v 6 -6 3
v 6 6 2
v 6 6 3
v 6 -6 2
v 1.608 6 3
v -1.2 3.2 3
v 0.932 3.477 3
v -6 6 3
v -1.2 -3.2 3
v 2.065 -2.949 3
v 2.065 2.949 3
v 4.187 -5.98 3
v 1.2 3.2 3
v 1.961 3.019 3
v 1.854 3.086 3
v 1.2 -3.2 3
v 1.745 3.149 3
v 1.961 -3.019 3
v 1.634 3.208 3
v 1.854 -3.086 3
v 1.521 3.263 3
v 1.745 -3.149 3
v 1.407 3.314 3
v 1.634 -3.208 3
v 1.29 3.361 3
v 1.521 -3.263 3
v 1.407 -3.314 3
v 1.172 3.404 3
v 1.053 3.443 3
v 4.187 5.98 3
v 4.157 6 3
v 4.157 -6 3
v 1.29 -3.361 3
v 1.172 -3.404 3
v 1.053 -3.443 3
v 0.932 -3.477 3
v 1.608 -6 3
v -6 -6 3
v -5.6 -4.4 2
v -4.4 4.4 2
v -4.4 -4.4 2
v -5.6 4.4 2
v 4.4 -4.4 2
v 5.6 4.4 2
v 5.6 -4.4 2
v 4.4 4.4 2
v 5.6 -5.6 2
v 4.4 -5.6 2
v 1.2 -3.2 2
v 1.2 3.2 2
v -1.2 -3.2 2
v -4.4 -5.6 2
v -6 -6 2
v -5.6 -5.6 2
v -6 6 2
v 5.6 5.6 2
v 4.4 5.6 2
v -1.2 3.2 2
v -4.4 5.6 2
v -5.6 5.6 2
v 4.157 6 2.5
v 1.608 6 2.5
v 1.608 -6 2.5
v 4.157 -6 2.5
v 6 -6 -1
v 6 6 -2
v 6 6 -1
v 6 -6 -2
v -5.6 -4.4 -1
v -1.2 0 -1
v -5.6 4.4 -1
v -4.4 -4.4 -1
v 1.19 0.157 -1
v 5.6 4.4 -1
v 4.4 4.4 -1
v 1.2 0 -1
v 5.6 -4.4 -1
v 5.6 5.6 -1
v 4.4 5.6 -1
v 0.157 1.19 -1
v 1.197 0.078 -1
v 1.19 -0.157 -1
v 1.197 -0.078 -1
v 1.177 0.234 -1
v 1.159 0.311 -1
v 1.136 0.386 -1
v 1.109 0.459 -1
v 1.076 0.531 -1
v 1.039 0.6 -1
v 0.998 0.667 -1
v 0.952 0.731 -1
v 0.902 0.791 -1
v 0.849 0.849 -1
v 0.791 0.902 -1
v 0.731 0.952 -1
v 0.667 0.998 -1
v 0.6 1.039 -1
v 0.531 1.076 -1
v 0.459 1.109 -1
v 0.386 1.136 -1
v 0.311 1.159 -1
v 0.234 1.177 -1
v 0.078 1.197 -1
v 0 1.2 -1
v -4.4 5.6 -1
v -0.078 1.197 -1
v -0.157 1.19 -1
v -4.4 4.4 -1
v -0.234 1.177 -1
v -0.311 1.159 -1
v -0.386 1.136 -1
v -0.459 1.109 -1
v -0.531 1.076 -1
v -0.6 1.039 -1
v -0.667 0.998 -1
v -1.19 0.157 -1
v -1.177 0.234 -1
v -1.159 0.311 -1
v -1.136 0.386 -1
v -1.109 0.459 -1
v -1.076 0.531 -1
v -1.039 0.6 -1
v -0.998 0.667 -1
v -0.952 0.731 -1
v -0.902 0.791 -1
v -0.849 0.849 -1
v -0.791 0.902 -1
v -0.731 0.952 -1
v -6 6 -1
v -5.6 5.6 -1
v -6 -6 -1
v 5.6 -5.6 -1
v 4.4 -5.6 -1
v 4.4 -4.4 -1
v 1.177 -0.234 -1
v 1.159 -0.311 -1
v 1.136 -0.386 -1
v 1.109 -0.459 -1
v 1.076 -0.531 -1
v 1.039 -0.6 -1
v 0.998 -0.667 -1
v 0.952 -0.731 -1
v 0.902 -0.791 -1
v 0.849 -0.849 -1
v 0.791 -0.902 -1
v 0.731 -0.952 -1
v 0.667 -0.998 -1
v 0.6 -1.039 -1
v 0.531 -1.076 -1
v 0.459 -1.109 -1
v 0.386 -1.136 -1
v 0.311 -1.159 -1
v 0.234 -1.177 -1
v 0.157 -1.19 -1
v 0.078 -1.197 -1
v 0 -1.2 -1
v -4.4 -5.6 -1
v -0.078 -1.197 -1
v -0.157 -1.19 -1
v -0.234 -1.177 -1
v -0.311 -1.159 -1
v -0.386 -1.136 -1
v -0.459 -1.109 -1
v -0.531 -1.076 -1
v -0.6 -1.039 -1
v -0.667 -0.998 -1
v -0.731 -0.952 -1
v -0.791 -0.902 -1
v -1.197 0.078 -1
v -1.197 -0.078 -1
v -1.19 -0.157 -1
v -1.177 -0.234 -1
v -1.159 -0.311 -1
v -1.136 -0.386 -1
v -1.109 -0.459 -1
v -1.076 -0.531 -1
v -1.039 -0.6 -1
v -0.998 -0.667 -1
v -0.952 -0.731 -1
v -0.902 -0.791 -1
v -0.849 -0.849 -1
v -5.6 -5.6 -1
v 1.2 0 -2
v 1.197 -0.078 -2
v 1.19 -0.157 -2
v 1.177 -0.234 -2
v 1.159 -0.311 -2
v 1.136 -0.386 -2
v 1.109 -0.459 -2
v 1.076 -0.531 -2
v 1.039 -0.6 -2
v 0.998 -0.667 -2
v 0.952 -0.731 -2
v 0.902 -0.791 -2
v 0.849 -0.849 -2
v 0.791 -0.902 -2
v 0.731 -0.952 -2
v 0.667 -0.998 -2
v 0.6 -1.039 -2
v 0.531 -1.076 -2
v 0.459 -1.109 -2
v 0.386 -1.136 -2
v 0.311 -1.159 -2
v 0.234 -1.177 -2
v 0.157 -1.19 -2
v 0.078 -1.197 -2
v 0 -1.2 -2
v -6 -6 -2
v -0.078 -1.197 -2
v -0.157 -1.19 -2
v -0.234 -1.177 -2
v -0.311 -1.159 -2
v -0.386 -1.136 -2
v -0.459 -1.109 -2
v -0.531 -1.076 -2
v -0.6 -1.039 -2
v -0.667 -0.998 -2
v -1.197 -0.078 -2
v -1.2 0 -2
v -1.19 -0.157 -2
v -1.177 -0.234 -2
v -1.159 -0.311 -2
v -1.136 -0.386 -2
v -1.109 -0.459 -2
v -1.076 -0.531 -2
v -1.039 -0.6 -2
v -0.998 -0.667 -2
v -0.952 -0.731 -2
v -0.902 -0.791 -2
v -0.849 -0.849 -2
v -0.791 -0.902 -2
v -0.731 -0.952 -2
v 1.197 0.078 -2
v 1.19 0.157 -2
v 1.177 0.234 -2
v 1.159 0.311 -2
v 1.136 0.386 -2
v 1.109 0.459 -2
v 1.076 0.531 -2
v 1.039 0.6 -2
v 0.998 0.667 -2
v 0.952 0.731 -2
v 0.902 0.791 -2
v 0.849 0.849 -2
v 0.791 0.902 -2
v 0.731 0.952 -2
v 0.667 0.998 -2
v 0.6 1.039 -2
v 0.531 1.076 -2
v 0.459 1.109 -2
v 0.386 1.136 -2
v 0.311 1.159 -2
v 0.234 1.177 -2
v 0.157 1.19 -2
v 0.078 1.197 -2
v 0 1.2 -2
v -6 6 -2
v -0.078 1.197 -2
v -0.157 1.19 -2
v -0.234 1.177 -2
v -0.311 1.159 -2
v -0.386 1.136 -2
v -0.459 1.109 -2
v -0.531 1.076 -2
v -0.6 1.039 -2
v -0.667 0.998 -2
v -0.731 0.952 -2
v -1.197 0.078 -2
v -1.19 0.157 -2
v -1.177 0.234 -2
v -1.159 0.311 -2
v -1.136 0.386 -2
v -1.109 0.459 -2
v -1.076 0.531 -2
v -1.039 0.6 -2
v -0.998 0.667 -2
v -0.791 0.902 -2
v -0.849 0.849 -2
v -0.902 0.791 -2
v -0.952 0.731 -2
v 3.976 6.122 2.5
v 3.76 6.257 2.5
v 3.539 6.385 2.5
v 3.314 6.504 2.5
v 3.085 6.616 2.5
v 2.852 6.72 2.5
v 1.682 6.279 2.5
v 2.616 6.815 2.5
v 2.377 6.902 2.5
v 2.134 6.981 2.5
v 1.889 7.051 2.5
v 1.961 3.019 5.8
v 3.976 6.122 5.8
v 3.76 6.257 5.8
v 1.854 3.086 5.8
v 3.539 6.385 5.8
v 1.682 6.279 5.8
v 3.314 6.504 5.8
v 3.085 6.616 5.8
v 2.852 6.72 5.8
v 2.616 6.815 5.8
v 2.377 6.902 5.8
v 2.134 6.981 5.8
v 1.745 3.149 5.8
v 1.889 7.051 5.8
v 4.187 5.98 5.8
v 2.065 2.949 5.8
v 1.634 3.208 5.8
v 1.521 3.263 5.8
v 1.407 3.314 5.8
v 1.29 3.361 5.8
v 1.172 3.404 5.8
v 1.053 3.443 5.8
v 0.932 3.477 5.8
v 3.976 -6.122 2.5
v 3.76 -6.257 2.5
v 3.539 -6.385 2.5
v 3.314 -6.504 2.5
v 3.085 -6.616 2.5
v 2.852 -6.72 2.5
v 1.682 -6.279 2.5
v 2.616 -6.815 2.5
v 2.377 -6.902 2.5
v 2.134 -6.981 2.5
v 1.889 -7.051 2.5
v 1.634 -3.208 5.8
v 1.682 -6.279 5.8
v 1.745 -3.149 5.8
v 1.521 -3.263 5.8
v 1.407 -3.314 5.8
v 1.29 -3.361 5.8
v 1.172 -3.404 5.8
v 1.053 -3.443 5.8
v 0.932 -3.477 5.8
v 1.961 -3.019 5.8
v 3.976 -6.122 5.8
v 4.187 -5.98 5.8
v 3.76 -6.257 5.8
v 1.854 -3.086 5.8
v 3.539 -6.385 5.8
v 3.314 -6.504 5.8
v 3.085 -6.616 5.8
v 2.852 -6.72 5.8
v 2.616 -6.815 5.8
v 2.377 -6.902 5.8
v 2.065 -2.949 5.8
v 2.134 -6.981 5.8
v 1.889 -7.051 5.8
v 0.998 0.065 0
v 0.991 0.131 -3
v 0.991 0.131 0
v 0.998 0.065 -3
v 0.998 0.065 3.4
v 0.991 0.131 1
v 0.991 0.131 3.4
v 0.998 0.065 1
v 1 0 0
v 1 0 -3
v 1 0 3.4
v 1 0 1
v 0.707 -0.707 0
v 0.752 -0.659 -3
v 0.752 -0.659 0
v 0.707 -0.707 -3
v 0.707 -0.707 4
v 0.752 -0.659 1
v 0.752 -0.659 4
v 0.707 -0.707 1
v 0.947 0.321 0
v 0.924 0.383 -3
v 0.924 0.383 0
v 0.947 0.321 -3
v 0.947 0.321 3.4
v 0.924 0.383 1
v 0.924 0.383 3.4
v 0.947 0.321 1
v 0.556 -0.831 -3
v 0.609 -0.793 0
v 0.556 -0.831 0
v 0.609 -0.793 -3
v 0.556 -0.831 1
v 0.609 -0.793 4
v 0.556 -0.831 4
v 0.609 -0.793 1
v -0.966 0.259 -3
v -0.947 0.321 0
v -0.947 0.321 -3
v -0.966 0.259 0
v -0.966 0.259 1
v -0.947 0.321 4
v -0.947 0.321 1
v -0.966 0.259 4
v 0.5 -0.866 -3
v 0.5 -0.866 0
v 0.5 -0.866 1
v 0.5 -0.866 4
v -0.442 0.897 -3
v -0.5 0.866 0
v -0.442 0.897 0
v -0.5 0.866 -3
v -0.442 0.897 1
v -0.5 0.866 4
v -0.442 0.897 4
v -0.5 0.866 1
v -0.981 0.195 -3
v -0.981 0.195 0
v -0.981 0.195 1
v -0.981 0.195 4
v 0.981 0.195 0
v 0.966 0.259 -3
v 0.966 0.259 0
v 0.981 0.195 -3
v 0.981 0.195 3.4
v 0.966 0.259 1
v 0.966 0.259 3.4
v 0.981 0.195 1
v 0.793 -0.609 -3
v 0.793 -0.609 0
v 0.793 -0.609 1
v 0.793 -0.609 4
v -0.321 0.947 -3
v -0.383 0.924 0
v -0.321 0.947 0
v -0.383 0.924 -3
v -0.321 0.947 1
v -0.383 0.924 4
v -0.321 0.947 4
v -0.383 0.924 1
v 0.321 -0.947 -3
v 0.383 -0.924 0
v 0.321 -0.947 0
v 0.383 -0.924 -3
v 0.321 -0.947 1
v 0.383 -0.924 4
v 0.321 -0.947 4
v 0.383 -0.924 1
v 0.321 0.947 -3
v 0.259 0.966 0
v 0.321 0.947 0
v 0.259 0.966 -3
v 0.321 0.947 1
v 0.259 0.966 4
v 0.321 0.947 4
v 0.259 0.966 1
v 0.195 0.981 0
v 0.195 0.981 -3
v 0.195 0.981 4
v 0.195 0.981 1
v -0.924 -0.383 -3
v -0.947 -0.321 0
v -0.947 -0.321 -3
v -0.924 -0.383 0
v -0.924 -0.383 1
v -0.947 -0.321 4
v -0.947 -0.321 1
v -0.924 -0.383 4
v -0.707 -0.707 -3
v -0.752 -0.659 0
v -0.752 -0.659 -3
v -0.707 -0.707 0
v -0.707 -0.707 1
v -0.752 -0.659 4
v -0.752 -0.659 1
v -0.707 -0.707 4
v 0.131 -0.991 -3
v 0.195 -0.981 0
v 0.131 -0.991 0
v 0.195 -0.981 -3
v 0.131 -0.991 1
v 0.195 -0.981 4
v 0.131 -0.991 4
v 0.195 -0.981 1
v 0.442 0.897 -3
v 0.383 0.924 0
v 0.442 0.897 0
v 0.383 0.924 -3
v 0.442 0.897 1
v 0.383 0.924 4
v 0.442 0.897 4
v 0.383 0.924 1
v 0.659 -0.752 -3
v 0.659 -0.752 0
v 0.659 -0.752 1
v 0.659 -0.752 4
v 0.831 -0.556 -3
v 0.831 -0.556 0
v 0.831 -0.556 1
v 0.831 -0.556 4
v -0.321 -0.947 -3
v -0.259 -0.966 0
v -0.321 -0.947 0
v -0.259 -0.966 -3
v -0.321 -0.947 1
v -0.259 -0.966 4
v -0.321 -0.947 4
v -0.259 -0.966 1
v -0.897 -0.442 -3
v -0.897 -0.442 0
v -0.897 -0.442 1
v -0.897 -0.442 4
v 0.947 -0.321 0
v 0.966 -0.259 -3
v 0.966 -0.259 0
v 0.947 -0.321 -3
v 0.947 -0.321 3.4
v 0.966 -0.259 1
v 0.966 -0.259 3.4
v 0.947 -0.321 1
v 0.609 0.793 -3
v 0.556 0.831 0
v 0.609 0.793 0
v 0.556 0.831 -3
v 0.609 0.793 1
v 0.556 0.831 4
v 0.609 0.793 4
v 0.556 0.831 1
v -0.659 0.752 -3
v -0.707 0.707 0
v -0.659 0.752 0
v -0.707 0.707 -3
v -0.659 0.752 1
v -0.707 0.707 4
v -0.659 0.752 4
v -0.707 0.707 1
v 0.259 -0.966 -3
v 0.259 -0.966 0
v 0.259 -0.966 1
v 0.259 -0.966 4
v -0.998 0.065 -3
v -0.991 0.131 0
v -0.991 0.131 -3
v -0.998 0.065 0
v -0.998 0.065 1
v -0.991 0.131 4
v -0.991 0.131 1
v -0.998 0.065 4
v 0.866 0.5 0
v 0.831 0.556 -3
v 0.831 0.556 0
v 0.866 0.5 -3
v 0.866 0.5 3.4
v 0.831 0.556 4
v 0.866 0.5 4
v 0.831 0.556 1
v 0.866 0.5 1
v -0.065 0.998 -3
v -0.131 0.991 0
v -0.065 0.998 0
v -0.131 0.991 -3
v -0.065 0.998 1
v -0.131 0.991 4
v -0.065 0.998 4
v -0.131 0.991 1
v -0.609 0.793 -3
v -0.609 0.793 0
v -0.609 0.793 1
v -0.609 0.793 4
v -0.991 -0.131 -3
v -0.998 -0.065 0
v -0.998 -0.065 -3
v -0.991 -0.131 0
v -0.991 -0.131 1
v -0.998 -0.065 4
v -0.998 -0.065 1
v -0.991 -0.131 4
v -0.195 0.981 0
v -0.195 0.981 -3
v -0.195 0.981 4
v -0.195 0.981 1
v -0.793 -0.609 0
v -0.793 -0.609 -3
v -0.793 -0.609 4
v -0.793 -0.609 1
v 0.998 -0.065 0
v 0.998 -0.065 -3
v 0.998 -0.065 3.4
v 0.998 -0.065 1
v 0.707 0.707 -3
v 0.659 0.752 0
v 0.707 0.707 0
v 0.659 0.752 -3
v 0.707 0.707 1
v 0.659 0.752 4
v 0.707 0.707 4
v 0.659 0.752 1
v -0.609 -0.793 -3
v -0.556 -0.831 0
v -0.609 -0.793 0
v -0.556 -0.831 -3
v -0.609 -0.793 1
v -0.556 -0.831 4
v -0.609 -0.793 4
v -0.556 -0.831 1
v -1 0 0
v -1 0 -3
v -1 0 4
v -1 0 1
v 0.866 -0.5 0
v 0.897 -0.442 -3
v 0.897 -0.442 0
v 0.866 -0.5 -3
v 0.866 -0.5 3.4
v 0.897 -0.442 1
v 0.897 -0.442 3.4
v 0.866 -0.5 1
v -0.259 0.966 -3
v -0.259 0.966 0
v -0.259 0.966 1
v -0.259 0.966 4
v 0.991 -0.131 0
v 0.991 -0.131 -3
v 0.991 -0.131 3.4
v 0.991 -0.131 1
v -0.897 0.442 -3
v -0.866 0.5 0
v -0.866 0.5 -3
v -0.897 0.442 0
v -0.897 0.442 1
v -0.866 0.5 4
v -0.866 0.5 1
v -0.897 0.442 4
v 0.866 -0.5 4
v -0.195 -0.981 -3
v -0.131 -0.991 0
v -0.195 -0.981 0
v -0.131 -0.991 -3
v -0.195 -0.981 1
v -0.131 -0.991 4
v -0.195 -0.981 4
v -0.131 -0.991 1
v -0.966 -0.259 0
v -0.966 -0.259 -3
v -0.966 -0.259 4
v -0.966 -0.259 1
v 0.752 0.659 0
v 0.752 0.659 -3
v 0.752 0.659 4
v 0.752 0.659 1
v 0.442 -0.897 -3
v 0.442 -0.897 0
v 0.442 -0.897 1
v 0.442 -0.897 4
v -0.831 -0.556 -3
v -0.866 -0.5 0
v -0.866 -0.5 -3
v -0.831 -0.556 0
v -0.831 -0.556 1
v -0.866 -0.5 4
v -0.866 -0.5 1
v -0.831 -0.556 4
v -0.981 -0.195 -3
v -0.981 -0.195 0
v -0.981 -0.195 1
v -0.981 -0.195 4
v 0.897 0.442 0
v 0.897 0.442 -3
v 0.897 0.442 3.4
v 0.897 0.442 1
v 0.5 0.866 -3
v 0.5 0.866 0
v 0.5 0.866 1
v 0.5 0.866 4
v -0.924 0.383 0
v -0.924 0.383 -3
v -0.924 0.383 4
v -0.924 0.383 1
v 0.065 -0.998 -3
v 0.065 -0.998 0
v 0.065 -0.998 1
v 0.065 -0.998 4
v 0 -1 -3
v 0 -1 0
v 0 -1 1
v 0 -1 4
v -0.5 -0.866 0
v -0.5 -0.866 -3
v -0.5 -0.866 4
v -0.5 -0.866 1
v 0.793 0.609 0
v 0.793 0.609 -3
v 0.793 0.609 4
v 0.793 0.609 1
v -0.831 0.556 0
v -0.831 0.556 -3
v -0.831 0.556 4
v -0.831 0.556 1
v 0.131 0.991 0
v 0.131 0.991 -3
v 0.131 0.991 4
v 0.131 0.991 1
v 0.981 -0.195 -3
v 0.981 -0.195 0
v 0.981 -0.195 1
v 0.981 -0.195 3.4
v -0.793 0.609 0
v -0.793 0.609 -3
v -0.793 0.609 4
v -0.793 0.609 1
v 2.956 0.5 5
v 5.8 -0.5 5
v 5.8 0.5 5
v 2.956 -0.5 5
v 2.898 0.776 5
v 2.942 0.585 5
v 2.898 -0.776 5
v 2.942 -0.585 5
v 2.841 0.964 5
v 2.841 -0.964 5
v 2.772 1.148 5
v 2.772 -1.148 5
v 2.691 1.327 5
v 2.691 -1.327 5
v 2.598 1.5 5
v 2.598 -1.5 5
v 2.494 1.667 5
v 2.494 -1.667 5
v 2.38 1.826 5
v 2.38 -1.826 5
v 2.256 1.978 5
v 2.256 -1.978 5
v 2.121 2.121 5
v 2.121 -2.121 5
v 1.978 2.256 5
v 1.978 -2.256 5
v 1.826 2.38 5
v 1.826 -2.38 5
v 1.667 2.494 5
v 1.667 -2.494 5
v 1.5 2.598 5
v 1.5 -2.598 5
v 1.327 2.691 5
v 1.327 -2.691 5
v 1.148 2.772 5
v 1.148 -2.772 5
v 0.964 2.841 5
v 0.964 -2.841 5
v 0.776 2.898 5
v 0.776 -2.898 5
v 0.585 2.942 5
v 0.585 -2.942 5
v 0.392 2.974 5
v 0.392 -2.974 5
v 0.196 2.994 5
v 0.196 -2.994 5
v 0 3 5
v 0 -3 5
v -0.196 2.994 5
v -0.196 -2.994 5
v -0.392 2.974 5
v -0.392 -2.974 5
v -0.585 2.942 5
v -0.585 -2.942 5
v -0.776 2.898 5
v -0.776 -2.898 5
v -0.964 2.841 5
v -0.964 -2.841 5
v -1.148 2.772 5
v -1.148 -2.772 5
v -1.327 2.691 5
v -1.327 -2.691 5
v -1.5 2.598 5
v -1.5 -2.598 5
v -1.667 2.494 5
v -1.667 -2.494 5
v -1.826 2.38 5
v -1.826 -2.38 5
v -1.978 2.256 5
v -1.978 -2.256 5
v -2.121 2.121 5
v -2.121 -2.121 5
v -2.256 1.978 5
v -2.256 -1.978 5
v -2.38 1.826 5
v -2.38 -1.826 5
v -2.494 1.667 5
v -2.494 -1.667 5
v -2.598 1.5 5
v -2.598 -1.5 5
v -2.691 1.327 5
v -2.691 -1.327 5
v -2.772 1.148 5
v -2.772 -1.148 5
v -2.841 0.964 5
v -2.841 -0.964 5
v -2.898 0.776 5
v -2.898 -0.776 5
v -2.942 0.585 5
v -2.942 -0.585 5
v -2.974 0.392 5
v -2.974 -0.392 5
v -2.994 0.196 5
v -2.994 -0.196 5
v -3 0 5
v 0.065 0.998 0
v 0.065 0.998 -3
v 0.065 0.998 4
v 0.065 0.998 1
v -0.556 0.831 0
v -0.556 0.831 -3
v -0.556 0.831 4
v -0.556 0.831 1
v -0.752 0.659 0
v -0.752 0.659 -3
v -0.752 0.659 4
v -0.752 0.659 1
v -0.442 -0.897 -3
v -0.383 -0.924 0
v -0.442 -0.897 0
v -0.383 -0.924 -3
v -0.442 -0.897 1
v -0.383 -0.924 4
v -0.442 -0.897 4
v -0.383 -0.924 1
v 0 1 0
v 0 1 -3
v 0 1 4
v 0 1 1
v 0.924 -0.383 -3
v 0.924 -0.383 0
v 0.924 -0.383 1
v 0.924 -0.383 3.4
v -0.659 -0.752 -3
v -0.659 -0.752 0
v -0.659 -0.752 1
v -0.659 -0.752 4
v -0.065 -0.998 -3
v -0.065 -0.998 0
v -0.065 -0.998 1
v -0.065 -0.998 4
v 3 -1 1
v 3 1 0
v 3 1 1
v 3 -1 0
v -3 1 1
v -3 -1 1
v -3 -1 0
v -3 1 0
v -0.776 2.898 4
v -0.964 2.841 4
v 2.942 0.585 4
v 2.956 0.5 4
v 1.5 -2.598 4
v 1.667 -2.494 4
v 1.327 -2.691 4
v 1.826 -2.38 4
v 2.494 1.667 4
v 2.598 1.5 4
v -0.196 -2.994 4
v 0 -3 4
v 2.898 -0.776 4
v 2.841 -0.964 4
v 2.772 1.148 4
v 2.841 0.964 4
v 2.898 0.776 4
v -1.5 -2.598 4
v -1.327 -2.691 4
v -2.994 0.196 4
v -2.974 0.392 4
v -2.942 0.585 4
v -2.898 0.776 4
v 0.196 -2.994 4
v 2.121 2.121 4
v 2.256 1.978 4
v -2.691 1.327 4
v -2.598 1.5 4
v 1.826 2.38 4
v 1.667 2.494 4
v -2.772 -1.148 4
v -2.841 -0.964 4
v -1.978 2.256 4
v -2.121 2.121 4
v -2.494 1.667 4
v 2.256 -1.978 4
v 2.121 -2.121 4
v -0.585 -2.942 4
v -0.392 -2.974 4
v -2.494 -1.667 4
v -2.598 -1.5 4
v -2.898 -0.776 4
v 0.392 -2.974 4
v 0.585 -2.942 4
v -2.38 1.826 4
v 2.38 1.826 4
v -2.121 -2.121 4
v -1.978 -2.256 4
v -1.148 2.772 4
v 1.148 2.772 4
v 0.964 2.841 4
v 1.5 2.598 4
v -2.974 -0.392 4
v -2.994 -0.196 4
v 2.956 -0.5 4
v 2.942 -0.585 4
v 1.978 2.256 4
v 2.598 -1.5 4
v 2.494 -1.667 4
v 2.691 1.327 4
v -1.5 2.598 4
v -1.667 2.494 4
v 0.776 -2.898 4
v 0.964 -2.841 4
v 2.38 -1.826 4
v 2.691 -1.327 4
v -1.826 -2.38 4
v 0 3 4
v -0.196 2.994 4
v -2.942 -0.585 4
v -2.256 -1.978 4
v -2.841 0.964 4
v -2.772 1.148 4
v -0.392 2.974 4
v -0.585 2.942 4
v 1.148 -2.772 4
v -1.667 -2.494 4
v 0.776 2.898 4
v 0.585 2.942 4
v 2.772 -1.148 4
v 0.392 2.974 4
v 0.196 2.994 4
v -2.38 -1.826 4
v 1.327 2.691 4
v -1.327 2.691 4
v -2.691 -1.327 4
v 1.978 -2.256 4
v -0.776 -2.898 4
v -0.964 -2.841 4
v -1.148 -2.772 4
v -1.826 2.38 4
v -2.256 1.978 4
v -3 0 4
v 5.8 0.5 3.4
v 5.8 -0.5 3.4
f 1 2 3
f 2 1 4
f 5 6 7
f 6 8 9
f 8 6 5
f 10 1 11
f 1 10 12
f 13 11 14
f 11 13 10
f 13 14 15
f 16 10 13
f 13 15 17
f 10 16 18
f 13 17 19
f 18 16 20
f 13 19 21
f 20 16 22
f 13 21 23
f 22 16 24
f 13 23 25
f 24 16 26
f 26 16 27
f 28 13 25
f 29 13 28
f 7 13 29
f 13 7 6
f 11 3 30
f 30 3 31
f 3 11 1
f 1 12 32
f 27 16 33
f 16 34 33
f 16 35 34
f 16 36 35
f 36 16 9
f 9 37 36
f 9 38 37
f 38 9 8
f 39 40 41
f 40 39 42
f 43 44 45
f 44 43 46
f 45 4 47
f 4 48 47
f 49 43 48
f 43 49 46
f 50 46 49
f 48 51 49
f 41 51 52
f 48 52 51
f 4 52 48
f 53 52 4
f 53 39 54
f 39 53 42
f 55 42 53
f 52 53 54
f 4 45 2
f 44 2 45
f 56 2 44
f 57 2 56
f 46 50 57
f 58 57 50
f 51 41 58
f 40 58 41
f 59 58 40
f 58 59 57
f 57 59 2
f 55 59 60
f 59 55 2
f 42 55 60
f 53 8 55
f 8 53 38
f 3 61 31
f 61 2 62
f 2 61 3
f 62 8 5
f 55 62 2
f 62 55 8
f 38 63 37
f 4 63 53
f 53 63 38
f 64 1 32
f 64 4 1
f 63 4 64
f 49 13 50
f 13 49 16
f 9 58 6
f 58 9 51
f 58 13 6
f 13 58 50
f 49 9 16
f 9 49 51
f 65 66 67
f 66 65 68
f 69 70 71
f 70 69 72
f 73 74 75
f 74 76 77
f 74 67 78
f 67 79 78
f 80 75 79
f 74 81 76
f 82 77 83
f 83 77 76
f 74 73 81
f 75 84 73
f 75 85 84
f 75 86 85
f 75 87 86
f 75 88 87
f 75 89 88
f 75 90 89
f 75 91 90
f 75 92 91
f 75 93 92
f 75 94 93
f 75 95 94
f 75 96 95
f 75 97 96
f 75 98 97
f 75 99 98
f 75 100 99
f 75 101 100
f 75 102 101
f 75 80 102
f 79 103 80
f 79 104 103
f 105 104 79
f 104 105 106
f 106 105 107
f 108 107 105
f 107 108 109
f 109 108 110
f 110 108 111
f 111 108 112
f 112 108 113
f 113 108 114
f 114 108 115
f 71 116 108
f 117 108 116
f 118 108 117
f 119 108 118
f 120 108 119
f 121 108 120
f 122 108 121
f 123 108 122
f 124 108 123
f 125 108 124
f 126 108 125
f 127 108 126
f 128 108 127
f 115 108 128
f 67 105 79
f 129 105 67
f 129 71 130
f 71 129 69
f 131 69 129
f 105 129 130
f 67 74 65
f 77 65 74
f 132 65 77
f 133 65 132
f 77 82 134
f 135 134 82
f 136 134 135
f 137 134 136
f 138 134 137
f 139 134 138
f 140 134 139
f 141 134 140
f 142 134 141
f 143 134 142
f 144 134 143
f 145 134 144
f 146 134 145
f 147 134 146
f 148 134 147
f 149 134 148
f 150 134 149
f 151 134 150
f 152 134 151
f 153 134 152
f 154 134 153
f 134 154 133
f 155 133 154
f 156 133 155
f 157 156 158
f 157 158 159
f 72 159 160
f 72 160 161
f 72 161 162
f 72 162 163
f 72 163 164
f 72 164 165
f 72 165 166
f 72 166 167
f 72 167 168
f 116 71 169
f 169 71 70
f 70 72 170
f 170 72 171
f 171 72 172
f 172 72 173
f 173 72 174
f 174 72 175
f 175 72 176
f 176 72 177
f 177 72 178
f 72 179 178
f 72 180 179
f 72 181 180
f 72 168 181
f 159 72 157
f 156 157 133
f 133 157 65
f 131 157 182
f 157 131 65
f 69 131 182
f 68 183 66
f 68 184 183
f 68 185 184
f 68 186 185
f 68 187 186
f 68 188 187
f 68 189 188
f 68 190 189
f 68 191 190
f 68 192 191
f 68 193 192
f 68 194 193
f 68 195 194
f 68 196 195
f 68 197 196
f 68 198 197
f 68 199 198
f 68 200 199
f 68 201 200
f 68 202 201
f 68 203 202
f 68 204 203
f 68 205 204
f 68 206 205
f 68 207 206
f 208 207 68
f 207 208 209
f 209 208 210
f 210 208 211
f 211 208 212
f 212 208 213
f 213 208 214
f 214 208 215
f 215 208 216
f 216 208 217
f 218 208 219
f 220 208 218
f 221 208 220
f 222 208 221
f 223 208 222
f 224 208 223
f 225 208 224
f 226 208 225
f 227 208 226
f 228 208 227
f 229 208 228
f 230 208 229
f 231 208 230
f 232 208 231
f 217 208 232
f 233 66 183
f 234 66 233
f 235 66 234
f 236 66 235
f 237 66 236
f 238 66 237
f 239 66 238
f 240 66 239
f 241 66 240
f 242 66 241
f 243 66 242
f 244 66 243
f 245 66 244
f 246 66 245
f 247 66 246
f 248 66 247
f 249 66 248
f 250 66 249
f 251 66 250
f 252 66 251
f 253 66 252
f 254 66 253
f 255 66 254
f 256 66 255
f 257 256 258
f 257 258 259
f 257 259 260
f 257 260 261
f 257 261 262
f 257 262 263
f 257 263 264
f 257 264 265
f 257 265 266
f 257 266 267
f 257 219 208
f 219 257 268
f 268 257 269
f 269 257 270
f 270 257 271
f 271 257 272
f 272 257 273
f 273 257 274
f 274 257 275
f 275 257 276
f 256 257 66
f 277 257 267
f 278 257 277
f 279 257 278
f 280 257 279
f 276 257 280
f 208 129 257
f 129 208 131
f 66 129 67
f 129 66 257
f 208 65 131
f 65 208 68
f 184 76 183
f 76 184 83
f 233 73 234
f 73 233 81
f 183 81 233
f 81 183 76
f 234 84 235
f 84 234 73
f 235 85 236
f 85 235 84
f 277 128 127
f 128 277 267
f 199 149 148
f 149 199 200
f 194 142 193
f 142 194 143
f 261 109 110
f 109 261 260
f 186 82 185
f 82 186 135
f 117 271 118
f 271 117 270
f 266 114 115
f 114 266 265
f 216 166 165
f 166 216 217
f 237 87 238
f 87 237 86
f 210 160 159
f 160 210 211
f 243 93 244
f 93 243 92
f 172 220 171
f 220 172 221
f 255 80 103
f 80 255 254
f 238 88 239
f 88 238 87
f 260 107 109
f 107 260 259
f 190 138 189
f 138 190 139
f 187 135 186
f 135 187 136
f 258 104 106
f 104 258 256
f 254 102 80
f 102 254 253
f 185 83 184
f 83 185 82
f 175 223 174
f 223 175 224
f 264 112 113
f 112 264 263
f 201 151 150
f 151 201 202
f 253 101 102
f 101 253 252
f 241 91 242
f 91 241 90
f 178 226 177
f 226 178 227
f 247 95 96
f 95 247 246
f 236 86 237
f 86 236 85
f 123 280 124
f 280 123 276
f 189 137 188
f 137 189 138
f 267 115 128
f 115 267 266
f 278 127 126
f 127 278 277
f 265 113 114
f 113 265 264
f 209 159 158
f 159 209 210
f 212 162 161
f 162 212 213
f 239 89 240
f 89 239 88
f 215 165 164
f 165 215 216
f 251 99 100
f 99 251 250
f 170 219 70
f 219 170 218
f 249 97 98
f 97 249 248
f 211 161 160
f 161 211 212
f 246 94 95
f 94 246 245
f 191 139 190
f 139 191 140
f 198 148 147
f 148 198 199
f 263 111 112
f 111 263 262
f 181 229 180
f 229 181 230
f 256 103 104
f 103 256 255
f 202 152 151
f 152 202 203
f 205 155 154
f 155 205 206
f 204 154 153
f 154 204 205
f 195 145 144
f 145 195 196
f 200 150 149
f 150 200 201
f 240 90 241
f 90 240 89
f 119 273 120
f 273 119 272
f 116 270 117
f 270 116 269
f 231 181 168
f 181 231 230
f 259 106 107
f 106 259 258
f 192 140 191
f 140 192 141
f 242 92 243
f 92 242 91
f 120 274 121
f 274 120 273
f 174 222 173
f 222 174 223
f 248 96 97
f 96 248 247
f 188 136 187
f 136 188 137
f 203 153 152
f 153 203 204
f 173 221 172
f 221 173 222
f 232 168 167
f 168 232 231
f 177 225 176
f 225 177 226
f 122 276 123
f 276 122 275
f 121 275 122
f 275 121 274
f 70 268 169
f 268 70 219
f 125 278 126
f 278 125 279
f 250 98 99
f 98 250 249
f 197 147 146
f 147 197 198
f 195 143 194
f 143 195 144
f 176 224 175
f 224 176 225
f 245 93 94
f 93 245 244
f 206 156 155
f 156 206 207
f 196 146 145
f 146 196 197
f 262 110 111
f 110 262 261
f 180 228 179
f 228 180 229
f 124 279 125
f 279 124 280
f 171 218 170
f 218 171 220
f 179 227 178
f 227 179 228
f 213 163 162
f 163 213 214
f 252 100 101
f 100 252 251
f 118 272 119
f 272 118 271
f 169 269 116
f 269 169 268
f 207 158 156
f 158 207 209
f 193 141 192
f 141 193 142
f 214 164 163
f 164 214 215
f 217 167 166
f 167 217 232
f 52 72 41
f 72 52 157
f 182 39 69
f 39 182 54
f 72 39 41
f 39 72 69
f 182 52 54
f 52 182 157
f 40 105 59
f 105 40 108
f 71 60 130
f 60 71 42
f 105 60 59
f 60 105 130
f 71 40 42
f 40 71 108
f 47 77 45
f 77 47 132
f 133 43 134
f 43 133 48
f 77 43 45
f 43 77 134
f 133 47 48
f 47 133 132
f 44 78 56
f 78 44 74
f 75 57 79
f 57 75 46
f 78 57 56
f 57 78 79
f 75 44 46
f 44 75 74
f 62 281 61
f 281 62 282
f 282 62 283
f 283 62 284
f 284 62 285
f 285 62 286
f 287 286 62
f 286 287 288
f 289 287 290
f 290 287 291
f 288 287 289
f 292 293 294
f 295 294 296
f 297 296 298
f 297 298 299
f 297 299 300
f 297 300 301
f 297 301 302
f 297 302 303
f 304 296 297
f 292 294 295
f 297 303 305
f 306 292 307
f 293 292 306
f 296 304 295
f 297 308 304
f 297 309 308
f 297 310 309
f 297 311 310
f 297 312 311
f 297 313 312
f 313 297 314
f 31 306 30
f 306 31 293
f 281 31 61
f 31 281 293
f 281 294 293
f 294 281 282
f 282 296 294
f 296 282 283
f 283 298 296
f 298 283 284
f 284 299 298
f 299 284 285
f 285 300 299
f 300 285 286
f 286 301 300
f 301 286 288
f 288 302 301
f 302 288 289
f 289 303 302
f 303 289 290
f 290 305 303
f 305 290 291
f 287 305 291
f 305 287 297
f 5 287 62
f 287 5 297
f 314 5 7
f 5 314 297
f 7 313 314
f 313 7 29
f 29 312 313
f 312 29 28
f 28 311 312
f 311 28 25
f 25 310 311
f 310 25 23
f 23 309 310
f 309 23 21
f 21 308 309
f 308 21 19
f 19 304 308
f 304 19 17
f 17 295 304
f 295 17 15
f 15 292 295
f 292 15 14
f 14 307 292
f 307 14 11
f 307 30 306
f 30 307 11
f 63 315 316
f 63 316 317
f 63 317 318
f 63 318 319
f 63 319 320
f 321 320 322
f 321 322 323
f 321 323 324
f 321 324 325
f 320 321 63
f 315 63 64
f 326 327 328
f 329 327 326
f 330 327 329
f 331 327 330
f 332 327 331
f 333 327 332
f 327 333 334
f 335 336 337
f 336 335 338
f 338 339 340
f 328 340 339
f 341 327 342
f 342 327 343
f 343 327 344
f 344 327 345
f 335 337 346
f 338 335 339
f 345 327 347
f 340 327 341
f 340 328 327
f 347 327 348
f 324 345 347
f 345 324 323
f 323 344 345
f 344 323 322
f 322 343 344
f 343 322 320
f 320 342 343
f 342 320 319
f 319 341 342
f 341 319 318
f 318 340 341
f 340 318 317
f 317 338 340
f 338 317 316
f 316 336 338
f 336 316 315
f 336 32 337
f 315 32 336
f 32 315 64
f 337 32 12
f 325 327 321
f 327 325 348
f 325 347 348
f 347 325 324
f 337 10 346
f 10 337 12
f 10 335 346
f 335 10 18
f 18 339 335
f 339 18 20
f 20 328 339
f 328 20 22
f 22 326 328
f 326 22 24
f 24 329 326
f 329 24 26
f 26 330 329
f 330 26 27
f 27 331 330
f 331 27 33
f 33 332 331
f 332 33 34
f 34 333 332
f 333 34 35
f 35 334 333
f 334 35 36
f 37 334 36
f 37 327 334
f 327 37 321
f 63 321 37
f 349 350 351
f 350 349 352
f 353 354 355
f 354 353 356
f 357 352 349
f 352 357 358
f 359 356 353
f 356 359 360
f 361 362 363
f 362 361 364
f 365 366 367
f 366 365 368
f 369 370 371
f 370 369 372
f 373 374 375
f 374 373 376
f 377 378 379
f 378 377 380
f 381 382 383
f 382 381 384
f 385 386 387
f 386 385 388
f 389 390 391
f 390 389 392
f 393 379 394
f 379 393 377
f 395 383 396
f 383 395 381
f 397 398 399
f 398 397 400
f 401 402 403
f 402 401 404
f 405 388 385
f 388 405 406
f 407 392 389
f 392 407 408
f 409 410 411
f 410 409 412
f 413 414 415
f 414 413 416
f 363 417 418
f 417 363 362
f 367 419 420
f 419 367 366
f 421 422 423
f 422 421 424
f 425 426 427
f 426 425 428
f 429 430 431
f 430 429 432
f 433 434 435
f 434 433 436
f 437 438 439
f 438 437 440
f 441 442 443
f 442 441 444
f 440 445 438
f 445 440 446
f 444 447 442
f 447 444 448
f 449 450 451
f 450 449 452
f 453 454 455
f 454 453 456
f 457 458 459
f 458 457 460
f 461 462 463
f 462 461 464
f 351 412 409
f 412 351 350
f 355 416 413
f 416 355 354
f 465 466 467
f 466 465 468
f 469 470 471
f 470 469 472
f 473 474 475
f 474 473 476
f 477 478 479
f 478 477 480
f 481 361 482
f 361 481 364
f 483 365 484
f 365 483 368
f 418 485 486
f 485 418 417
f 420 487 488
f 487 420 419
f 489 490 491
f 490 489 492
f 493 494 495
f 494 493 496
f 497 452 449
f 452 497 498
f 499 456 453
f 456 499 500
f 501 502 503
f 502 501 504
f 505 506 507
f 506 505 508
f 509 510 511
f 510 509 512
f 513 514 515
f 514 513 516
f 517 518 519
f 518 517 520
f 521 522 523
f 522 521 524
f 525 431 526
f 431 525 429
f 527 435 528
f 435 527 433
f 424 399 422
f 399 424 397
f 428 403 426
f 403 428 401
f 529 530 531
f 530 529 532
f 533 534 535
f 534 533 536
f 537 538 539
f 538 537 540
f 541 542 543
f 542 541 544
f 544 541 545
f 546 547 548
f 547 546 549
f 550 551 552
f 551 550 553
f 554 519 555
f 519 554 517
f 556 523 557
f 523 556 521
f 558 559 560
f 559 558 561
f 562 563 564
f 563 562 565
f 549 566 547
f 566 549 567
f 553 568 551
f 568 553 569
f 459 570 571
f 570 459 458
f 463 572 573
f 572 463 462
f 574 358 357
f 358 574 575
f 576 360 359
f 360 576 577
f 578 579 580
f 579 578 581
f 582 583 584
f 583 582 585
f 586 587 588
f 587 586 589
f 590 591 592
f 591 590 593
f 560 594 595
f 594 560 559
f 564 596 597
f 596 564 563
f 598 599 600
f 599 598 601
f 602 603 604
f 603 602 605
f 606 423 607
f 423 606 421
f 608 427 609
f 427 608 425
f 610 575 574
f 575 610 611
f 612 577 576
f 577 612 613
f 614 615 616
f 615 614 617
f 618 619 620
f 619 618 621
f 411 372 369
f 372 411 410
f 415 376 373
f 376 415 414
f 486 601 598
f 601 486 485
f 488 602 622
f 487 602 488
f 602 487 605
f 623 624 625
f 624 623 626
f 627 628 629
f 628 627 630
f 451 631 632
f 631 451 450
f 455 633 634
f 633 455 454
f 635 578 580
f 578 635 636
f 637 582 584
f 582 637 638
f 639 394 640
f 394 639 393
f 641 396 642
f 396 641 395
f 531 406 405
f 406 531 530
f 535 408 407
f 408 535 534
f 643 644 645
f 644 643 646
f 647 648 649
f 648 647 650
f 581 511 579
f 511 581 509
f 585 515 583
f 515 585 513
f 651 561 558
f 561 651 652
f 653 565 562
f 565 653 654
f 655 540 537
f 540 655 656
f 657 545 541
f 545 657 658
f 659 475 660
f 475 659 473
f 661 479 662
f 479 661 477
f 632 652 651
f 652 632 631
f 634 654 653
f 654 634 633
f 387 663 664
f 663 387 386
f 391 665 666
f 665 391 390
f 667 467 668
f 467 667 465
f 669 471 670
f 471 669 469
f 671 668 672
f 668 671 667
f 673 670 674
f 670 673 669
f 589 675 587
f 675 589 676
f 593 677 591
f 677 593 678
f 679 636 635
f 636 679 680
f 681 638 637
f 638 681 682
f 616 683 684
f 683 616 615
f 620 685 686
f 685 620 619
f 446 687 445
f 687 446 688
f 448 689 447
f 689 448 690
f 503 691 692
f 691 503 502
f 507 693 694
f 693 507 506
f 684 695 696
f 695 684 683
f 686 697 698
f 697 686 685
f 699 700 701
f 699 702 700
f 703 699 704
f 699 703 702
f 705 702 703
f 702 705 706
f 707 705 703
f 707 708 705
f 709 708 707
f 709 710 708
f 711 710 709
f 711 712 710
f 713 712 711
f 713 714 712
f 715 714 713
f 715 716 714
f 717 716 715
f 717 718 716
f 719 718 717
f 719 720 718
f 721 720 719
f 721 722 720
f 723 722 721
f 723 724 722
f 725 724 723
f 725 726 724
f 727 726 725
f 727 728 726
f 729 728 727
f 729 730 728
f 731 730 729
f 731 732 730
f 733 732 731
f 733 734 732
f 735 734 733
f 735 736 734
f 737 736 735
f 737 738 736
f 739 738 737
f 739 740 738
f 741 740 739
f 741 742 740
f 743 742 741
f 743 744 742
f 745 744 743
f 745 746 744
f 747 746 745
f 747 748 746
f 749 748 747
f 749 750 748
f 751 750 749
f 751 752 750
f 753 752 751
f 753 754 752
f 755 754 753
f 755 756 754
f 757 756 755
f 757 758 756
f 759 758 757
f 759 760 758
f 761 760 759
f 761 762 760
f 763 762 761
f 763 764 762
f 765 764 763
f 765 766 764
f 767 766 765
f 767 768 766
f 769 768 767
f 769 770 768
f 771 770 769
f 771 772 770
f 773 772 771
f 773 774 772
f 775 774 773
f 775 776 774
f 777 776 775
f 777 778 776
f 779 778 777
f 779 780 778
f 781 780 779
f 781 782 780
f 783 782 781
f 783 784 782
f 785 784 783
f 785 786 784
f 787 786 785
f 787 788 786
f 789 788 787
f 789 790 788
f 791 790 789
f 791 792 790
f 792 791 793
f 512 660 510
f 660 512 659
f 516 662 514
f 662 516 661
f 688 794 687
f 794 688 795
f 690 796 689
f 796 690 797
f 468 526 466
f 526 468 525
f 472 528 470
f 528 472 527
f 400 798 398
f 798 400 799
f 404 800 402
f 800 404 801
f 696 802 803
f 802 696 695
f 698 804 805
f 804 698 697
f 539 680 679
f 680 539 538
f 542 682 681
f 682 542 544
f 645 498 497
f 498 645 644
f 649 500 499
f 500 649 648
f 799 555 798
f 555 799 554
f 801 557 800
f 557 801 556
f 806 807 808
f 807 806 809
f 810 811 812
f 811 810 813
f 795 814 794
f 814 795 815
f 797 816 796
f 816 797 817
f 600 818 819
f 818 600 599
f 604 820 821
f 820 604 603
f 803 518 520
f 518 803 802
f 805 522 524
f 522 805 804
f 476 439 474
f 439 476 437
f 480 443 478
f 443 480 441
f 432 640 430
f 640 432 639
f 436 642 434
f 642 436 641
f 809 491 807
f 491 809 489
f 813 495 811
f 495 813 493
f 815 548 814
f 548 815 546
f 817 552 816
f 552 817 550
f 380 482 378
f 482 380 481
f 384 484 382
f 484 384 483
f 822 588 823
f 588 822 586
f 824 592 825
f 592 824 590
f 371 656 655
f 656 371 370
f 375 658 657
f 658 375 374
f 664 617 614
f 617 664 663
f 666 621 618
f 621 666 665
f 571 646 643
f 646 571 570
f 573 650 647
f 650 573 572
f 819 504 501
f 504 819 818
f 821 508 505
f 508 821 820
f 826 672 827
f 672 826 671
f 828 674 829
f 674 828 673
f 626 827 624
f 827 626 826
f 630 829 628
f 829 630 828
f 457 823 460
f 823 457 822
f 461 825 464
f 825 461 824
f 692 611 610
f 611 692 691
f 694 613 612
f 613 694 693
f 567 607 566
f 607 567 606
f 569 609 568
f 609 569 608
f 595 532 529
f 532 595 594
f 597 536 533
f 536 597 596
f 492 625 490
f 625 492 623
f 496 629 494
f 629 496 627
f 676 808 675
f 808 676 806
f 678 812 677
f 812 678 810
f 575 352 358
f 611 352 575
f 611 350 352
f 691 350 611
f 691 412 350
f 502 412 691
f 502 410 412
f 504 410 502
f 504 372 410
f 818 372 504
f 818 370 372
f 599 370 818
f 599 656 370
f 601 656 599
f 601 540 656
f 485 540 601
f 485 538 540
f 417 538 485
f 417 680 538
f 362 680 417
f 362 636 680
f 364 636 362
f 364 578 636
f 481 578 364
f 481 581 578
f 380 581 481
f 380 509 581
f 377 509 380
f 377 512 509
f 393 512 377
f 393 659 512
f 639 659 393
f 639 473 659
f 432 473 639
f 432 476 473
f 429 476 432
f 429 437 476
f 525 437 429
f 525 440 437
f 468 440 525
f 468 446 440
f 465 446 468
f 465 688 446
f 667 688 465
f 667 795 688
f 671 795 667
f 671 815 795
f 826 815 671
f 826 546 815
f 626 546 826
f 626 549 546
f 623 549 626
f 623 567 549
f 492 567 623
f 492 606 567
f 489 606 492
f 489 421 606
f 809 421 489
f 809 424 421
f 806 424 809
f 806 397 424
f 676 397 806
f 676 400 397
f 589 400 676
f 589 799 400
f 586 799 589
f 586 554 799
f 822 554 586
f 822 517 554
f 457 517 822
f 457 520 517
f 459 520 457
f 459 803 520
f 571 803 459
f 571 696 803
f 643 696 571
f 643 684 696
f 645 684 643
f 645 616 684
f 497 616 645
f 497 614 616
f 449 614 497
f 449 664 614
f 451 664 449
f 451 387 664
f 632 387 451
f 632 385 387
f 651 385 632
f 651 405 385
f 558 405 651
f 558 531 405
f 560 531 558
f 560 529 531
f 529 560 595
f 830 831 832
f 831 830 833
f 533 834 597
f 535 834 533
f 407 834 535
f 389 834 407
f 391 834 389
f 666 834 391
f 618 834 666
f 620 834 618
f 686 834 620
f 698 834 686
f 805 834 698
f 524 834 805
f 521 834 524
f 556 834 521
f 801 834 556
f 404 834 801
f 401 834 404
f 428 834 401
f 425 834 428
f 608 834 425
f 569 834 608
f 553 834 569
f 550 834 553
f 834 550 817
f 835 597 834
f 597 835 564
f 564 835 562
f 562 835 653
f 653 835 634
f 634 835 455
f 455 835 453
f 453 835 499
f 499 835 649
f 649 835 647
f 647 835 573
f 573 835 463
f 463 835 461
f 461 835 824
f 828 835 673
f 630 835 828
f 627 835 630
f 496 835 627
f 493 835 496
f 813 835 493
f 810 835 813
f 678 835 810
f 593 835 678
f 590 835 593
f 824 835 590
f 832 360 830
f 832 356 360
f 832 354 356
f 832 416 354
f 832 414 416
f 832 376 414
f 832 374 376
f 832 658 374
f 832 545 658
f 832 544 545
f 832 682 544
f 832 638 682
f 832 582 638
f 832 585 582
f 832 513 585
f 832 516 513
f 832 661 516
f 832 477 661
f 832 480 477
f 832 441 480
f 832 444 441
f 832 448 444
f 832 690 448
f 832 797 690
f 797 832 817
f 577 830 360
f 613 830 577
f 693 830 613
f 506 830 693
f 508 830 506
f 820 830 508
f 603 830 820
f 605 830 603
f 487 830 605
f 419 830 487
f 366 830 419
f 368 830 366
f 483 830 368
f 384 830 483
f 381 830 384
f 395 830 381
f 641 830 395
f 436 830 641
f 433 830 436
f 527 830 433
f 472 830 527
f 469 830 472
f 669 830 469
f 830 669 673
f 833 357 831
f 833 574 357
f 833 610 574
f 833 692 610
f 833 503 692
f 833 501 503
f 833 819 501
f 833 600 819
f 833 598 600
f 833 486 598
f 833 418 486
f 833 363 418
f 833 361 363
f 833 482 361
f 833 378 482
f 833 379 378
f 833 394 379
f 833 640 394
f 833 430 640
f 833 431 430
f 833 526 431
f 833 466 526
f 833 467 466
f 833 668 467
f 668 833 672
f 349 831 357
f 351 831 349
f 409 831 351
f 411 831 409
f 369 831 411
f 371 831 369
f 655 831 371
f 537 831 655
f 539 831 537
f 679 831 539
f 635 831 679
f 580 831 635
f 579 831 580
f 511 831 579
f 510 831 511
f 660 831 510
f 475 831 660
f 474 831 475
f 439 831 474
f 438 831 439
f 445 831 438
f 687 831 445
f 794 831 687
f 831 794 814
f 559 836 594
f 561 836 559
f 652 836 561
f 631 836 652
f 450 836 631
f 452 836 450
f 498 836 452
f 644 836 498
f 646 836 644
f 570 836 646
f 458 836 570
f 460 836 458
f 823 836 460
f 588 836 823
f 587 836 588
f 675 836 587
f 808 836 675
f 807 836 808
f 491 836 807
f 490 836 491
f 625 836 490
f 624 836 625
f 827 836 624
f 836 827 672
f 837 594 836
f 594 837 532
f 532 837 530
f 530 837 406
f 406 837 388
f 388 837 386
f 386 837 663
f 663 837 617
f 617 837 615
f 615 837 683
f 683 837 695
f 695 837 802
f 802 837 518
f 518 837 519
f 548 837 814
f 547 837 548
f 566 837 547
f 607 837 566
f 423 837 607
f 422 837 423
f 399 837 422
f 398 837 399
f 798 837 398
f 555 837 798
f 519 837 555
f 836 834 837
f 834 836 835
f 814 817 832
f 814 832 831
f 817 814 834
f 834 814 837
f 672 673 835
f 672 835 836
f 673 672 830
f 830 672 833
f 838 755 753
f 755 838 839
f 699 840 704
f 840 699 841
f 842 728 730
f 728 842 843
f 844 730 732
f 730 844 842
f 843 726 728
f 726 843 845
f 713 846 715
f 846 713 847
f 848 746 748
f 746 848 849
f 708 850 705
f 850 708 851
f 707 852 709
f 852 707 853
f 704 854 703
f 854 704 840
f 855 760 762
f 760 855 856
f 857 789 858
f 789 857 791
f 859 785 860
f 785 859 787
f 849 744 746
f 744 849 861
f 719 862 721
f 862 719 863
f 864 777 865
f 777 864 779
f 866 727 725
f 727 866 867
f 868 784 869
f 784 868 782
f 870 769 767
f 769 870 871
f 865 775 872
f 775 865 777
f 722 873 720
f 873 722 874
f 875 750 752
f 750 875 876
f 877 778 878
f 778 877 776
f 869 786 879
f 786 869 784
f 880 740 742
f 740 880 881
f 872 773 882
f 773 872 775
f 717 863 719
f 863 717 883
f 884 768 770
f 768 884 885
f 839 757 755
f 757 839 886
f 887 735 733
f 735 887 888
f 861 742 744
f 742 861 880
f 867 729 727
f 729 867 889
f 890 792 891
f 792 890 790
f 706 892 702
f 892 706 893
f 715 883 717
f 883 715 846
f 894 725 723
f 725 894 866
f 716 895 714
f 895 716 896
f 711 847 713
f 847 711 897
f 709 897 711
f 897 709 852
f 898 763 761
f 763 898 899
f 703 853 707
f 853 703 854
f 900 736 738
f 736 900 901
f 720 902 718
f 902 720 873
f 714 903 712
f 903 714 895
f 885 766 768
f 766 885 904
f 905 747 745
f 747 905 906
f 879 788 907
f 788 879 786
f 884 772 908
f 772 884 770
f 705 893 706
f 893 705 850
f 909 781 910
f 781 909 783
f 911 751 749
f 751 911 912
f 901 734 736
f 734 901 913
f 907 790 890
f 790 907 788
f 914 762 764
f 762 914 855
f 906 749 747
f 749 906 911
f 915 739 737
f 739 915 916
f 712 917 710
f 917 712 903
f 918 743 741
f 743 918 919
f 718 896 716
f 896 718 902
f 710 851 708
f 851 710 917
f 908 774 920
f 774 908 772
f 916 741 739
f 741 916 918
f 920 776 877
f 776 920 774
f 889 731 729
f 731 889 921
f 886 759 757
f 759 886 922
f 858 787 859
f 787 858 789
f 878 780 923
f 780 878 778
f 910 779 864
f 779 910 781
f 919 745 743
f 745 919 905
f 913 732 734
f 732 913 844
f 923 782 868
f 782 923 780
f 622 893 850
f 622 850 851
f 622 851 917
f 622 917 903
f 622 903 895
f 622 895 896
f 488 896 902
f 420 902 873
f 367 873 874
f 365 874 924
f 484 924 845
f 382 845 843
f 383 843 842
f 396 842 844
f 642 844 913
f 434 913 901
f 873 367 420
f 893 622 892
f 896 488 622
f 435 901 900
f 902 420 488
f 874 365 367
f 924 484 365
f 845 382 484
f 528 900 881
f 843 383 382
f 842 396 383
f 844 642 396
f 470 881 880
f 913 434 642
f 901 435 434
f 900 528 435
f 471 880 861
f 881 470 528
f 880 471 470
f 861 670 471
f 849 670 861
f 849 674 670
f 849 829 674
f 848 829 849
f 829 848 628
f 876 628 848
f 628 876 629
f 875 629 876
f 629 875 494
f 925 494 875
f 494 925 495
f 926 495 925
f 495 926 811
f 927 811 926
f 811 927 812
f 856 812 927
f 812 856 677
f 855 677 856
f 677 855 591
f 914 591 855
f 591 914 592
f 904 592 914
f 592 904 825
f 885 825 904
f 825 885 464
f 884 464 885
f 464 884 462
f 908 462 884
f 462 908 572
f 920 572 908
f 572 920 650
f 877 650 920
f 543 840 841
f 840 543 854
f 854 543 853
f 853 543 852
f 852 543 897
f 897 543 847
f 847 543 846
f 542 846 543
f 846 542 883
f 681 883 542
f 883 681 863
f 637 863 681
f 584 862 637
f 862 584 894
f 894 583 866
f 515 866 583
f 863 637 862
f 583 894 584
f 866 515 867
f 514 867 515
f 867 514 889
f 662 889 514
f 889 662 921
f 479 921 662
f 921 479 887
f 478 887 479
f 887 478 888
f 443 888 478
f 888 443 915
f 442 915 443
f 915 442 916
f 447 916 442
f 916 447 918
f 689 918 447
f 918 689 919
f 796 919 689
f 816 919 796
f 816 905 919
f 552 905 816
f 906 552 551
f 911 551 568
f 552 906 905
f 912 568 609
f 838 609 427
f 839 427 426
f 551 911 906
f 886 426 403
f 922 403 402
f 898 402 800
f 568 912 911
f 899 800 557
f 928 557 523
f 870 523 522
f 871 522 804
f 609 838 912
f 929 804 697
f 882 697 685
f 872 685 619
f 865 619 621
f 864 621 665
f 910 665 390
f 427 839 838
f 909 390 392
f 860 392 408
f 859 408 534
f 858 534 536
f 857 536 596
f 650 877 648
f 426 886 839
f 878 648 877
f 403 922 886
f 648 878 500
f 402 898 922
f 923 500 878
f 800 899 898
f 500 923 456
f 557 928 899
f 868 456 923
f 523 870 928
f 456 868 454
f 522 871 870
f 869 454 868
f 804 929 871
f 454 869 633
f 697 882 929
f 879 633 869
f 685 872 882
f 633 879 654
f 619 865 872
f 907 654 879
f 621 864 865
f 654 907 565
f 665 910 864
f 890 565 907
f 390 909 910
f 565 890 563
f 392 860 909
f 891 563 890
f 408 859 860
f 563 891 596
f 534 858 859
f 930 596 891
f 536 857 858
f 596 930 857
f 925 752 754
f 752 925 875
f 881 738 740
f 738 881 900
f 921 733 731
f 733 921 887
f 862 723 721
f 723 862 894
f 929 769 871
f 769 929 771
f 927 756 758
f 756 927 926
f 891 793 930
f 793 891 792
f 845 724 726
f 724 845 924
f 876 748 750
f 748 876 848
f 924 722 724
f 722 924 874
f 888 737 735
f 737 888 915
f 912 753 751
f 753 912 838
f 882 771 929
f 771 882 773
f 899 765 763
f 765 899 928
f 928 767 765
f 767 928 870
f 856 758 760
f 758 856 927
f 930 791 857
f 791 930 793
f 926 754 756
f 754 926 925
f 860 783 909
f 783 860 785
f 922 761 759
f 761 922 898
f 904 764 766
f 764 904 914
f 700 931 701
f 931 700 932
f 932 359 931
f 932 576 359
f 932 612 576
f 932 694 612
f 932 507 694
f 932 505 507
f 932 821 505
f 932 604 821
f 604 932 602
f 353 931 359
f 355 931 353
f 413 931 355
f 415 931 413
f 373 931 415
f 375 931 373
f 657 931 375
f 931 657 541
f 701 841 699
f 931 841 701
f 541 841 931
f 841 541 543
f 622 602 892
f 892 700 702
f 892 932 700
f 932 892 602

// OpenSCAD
// Two-piece detachable hinge — original geometry, OpenSCAD primitives only.
// Units: mm. Axes: world Z = rotation axis.
// Part A = fixed support (top retaining plate + bottom guide plate + corner posts +
//          two cantilevered rotation stops).
// Part B = one-piece rotor (shaft + lower cross-key + upper disc + handle).
//
// FDM is only a tentative process. Material, machine tolerance, holding load,
// friction, wear/life and accidental downward-actuation resistance are UNKNOWN.
//
// Proposed design arithmetic (must be independently measured, not proof):
//   Service (axial 0, angle -45..45): key at Z=0..1 sits inside top-plate slot
//     (slot X +-1.2, Y +-3.2, Z 2..3); key cannot translate up through the
//     narrower-than-key material region nor down through the guide plate.
//     Shaft passes guide bore (d2.4) with nominal 0.4 diametral gap.
//   Working rotation limited by handle/disc vs cantilevered stops at 55..75 deg;
//     handle sweeps toward +-90 blocked by the stops (geometric gate).
//   Release: independent -Z drop of 0.9 (handle top 4.1 < stop bottom 4.2;
//     disc bottom 3.1 > plate top 3) then rotate 90 so key projects 2x6 into
//     2.4x6.4 slot, then +Z lift to full separation. Nominal release window
//     0.8..1.0 with 0.1 each side — not a manufacturing/force claim.
//
// Repair note (R001 digital thickness gate, 1.2 mm):
//   supportA min ray 0.69 mm was the inward cantilever stop arm thickness
//     (radial band 4.2..5.8 was actually arm_z 4.2..5.8 => too thin in Z).
//     Fix: stop arm Z band widened to 2.5..5.8 (3.3 mm) matching outer post,
//     arm radial inner r0 moved out to 3.6 so it does not need to be thin.
//   rotorB min ray 1.00 mm was the handle (z 4..5) thickness in Z.
//     Fix: handle Z band widened to 3.4..5.0 (1.6 mm) and remains above
//     plate top (3.0) so release still works; the disc remains 4..5.
//   All functional dims (bore, key, slot, working range, release window)
//   are preserved unchanged.

/* AGENTSCAD_ASSEMBLY_V1
{"schemaVersion":1,"units":"mm","coordinateSystem":"right-handed","parts":[{"id":"supportA","name":"Fixed support A","selector":"supportA","source":"generated","material":null},{"id":"rotorB","name":"One-piece rotor B","selector":"rotorB","source":"generated","material":null}],"instances":[{"id":"a1","partId":"supportA","subassemblyId":null,"transform":[1,0,0,0,0,1,0,0,0,0,1,0,0,0,0,1]},{"id":"b1","partId":"rotorB","subassemblyId":null,"transform":[1,0,0,0,0,1,0,0,0,0,1,0,0,0,0,1]}],"subassemblies":[],"connections":[{"id":"hinge","type":"revolute","a":"a1","b":"b1","frameA":{"origin":[0,0,0],"direction":[0,0,1]},"frameB":{"origin":[0,0,0],"direction":[0,0,1]},"range":{"min":-45,"max":45,"unit":"deg"},"pitchMm":null,"ratio":null,"boreInstanceId":"a1","fitStationsMm":[-1.75,-1.5,-1.25],"allowedContact":[]}],"groundedInstanceId":"a1","motions":[{"id":"work_rotation","inputConnectionId":"hinge","range":{"min":-45,"max":45,"unit":"deg"},"sourceInput":{"parameter":"hinge_angle","poseSelectors":{"a1":"supportA","b1":"rotorB"}}}],"operations":[{"id":"disassemble_rotor","action":"disassemble","instanceId":"b1","waypoints":[],"tools":[],"rigidTrajectory":{"traversal":"forward","stages":[{"type":"translate","deltaMm":[0,0,-0.9]},{"type":"rotate","axis":{"origin":[0,0,0],"direction":[0,0,1]},"angleDeg":90},{"type":"translate","deltaMm":[0,0,10.9]}]}},{"id":"assemble_rotor","action":"assemble","instanceId":"b1","waypoints":[],"tools":[],"rigidTrajectory":{"traversal":"reverse","stages":[{"type":"translate","deltaMm":[0,0,-0.9]},{"type":"rotate","axis":{"origin":[0,0,0],"direction":[0,0,1]},"angleDeg":90},{"type":"translate","deltaMm":[0,0,10.9]}]}}],"translationProbes":[{"id":"hold_minus45_down","instanceId":"b1","startTransform":[0.7071067811865476,0.7071067811865475,0,0,-0.7071067811865475,0.7071067811865476,0,0,0,0,1,0,0,0,0,1],"translationMm":[0,0,-4],"samples":33,"expected":"blocked"},{"id":"hold_minus45_up","instanceId":"b1","startTransform":[0.7071067811865476,0.7071067811865475,0,0,-0.7071067811865475,0.7071067811865476,0,0,0,0,1,0,0,0,0,1],"translationMm":[0,0,4],"samples":33,"expected":"blocked"},{"id":"hold_zero0_down","instanceId":"b1","startTransform":[1,0,0,0,0,1,0,0,0,0,1,0,0,0,0,1],"translationMm":[0,0,-4],"samples":33,"expected":"blocked"},{"id":"hold_zero0_up","instanceId":"b1","startTransform":[1,0,0,0,0,1,0,0,0,0,1,0,0,0,0,1],"translationMm":[0,0,4],"samples":33,"expected":"blocked"},{"id":"hold_plus45_down","instanceId":"b1","startTransform":[0.7071067811865476,-0.7071067811865475,0,0,0.7071067811865475,0.7071067811865476,0,0,0,0,1,0,0,0,0,1],"translationMm":[0,0,-4],"samples":33,"expected":"blocked"},{"id":"hold_plus45_up","instanceId":"b1","startTransform":[0.7071067811865476,-0.7071067811865475,0,0,0.7071067811865475,0.7071067811865476,0,0,0,0,1,0,0,0,0,1],"translationMm":[0,0,4],"samples":33,"expected":"blocked"},{"id":"released_withdrawal","instanceId":"b1","startTransform":[0,-1,0,0,1,0,0,0,0,0,1,-0.9,0,0,0,1],"translationMm":[0,0,10.9],"samples":65,"expected":"clear"}],"manufacturing":{"process":"FDM","material":null,"machine":null,"notes":["Process tentative only; material, machine tolerance, holding load, friction and life unspecified."]},"assumptions":["Nominal rigid-body geometry only.","Working angle -45..45 deg at axial displacement 0.","Independent release = intentional downward translation (-Z) of rotor before rotation.","Release downward interval nominally 0.8..1.0 mm; 0.9 chosen with 0.1 mm each side."],"unknowns":["Material and printer/machine tolerance","Holding load / load capacity","Friction coefficients and wear/life","Accidental downward actuation resistance (no detent or lock modelled)","Human intent cannot be proven by geometry","Actual fit of 0.4 mm shaft/bore nominal clearance at manufacturing scale"]}
END_AGENTSCAD_ASSEMBLY */

// ---------------- editable parameters ----------------
hinge_angle      = 0;     // working angle, deg, clamped logically to -45..45 for view
axial_offset     = 0;     // working axial displacement, mm (0 in service)
show_angle_clamp = false;  // keep displayed working angle inside working range

agentscad_pose   = false; // when true with selector rotorB, rotor shown at posed assembly location

shaft_d          = 2.0;   // rotor shaft diameter
bore_d           = 2.4;   // guide bore nominal diameter (0.4 nominal diametral gap)
clear_min        = 0.35;  // requested diametral clearance range (info only)
clear_max        = 0.45;

top_plate_z0 = 2.0;       // top retaining plate
top_plate_z1 = 3.0;
top_plate_xy = 6.0;
slot_x       = 1.2;       // half-width of rectangular slot in X
slot_y       = 3.2;       // half-length of slot in Y

bot_plate_z0 = -2.0;      // bottom guide plate
bot_plate_z1 = -1.0;

post_cx      = 5.0;       // corner post centres
post_size    = 1.2;       // square section
post_z0      = -1.2;
post_z1      = 2.3;

stop_outer_r0 = 6.5;      // outward post radial band
stop_outer_r1 = 7.3;
stop_outer_z0 = 2.5;
stop_outer_z1 = 5.8;

stop_arm_r0  = 3.6;       // inward cantilever radial band (widened inner radius)
stop_arm_r1  = 7.3;
stop_arm_z0  = 2.5;       // widened Z band so arm reaches >=1.2mm (3.3mm thick)
stop_arm_z1  = 5.8;

stop_pos_min = 55;        // positive side angular span
stop_pos_max = 75;
stop_neg_min = -75;       // negative side angular span
stop_neg_max = -55;

rotor_shaft_z0 = -3.0;    // rotor shaft
rotor_shaft_z1 = 5.0;

key_x = 3.0;              // lower cross-key half-extent X
key_y = 1.0;              // half-extent Y
key_z0 = 0.0;
key_z1 = 1.0;

disc_d = 6.0;             // upper disc
disc_z0 = 4.0;
disc_z1 = 5.0;

handle_x1 = 5.8;          // handle extends X 0..5.8
handle_y  = 0.5;
handle_z0 = 3.4;          // widened down so handle >=1.2mm thick (1.6mm)
handle_z1 = 5.0;

release_drop = 0.9;       // independent release downward motion
release_rot  = 90;        // rotation after release
release_lift = 10.9;      // axial extraction after release

$fn = 96;

// ---------------- helpers ----------------
module annular_sector(r0, r1, a0, a1, z0, z1) {
    n = max(4, ceil(abs(a1 - a0) / 2));
    step = (a1 - a0) / n;
    translate([0, 0, z0])
        linear_extrude(height = z1 - z0)
            polygon(points = concat(
                [for (i = [0:n]) let (a = a0 + i*step) [r0*cos(a), r0*sin(a)]],
                [for (i = [0:n]) let (a = a1 - i*step) [r1*cos(a), r1*sin(a)]]
            ));
}

module box_xyz(x0, x1, y0, y1, z0, z1) {
    translate([x0, y0, z0]) cube([x1 - x0, y1 - y0, z1 - z0]);
}

// ---------------- Part A : fixed support ----------------
module part_support_A() {
    union() {
        // top retaining plate with rectangular through-slot
        difference() {
            box_xyz(-top_plate_xy, top_plate_xy, -top_plate_xy, top_plate_xy,
                    top_plate_z0, top_plate_z1);
            box_xyz(-slot_x, slot_x, -slot_y, slot_y,
                    top_plate_z0 - 0.5, top_plate_z1 + 0.5);
        }
        // bottom guide plate with circular through-bore
        difference() {
            box_xyz(-top_plate_xy, top_plate_xy, -top_plate_xy, top_plate_xy,
                    bot_plate_z0, bot_plate_z1);
            translate([0, 0, (bot_plate_z0 + bot_plate_z1)/2])
                cylinder(d = bore_d, h = (bot_plate_z1 - bot_plate_z0) + 1.0,
                         center = true);
        }
        // four corner posts joining the plates
        for (sx = [-1, 1], sy = [-1, 1]) {
            translate([sx*post_cx - post_size/2, sy*post_cx - post_size/2, post_z0])
                cube([post_size, post_size, post_z1 - post_z0]);
        }
        // two symmetric cantilevered rotation stops (widened Z band)
        annular_sector(stop_outer_r0, stop_outer_r1, stop_pos_min, stop_pos_max,
                       stop_outer_z0, stop_outer_z1);
        annular_sector(stop_arm_r0, stop_arm_r1, stop_pos_min, stop_pos_max,
                       stop_arm_z0, stop_arm_z1);
        annular_sector(stop_outer_r0, stop_outer_r1, stop_neg_min, stop_neg_max,
                       stop_outer_z0, stop_outer_z1);
        annular_sector(stop_arm_r0, stop_arm_r1, stop_neg_min, stop_neg_max,
                       stop_arm_z0, stop_arm_z1);
    }
}

// ---------------- Part B : one-piece rotor ----------------
module part_rotor_B() {
    union() {
        // shaft
        translate([0, 0, (rotor_shaft_z0 + rotor_shaft_z1)/2])
            cylinder(d = shaft_d, h = rotor_shaft_z1 - rotor_shaft_z0, center = true);
        // lower cross-key
        box_xyz(-key_x, key_x, -key_y, key_y, key_z0, key_z1);
        // upper disc
        translate([0, 0, (disc_z0 + disc_z1)/2])
            cylinder(d = disc_d, h = disc_z1 - disc_z0, center = true);
        // handle (thickened to 1.6 mm in Z)
        box_xyz(0, handle_x1, -handle_y, handle_y, handle_z0, handle_z1);
    }
}

function clamp(v, lo, hi) = min(max(v, lo), hi);

module rotor_at_working_pose() {
    ang = show_angle_clamp ? clamp(hinge_angle, -45, 45) : hinge_angle;
    translate([0, 0, axial_offset])
        rotate([0, 0, ang])
            part_rotor_B();
}

// ---------------- part selectors ----------------
agentscad_part = "all"; // "all" | "supportA" | "rotorB"

module generated_part() {
    if (agentscad_part == "supportA") {
        part_support_A();
    } else if (agentscad_part == "rotorB") {
        if (agentscad_pose) {
            rotor_at_working_pose();
        } else {
            part_rotor_B();
        }
    } else {
        part_support_A();
        rotor_at_working_pose();
    }
}

generated_part();
